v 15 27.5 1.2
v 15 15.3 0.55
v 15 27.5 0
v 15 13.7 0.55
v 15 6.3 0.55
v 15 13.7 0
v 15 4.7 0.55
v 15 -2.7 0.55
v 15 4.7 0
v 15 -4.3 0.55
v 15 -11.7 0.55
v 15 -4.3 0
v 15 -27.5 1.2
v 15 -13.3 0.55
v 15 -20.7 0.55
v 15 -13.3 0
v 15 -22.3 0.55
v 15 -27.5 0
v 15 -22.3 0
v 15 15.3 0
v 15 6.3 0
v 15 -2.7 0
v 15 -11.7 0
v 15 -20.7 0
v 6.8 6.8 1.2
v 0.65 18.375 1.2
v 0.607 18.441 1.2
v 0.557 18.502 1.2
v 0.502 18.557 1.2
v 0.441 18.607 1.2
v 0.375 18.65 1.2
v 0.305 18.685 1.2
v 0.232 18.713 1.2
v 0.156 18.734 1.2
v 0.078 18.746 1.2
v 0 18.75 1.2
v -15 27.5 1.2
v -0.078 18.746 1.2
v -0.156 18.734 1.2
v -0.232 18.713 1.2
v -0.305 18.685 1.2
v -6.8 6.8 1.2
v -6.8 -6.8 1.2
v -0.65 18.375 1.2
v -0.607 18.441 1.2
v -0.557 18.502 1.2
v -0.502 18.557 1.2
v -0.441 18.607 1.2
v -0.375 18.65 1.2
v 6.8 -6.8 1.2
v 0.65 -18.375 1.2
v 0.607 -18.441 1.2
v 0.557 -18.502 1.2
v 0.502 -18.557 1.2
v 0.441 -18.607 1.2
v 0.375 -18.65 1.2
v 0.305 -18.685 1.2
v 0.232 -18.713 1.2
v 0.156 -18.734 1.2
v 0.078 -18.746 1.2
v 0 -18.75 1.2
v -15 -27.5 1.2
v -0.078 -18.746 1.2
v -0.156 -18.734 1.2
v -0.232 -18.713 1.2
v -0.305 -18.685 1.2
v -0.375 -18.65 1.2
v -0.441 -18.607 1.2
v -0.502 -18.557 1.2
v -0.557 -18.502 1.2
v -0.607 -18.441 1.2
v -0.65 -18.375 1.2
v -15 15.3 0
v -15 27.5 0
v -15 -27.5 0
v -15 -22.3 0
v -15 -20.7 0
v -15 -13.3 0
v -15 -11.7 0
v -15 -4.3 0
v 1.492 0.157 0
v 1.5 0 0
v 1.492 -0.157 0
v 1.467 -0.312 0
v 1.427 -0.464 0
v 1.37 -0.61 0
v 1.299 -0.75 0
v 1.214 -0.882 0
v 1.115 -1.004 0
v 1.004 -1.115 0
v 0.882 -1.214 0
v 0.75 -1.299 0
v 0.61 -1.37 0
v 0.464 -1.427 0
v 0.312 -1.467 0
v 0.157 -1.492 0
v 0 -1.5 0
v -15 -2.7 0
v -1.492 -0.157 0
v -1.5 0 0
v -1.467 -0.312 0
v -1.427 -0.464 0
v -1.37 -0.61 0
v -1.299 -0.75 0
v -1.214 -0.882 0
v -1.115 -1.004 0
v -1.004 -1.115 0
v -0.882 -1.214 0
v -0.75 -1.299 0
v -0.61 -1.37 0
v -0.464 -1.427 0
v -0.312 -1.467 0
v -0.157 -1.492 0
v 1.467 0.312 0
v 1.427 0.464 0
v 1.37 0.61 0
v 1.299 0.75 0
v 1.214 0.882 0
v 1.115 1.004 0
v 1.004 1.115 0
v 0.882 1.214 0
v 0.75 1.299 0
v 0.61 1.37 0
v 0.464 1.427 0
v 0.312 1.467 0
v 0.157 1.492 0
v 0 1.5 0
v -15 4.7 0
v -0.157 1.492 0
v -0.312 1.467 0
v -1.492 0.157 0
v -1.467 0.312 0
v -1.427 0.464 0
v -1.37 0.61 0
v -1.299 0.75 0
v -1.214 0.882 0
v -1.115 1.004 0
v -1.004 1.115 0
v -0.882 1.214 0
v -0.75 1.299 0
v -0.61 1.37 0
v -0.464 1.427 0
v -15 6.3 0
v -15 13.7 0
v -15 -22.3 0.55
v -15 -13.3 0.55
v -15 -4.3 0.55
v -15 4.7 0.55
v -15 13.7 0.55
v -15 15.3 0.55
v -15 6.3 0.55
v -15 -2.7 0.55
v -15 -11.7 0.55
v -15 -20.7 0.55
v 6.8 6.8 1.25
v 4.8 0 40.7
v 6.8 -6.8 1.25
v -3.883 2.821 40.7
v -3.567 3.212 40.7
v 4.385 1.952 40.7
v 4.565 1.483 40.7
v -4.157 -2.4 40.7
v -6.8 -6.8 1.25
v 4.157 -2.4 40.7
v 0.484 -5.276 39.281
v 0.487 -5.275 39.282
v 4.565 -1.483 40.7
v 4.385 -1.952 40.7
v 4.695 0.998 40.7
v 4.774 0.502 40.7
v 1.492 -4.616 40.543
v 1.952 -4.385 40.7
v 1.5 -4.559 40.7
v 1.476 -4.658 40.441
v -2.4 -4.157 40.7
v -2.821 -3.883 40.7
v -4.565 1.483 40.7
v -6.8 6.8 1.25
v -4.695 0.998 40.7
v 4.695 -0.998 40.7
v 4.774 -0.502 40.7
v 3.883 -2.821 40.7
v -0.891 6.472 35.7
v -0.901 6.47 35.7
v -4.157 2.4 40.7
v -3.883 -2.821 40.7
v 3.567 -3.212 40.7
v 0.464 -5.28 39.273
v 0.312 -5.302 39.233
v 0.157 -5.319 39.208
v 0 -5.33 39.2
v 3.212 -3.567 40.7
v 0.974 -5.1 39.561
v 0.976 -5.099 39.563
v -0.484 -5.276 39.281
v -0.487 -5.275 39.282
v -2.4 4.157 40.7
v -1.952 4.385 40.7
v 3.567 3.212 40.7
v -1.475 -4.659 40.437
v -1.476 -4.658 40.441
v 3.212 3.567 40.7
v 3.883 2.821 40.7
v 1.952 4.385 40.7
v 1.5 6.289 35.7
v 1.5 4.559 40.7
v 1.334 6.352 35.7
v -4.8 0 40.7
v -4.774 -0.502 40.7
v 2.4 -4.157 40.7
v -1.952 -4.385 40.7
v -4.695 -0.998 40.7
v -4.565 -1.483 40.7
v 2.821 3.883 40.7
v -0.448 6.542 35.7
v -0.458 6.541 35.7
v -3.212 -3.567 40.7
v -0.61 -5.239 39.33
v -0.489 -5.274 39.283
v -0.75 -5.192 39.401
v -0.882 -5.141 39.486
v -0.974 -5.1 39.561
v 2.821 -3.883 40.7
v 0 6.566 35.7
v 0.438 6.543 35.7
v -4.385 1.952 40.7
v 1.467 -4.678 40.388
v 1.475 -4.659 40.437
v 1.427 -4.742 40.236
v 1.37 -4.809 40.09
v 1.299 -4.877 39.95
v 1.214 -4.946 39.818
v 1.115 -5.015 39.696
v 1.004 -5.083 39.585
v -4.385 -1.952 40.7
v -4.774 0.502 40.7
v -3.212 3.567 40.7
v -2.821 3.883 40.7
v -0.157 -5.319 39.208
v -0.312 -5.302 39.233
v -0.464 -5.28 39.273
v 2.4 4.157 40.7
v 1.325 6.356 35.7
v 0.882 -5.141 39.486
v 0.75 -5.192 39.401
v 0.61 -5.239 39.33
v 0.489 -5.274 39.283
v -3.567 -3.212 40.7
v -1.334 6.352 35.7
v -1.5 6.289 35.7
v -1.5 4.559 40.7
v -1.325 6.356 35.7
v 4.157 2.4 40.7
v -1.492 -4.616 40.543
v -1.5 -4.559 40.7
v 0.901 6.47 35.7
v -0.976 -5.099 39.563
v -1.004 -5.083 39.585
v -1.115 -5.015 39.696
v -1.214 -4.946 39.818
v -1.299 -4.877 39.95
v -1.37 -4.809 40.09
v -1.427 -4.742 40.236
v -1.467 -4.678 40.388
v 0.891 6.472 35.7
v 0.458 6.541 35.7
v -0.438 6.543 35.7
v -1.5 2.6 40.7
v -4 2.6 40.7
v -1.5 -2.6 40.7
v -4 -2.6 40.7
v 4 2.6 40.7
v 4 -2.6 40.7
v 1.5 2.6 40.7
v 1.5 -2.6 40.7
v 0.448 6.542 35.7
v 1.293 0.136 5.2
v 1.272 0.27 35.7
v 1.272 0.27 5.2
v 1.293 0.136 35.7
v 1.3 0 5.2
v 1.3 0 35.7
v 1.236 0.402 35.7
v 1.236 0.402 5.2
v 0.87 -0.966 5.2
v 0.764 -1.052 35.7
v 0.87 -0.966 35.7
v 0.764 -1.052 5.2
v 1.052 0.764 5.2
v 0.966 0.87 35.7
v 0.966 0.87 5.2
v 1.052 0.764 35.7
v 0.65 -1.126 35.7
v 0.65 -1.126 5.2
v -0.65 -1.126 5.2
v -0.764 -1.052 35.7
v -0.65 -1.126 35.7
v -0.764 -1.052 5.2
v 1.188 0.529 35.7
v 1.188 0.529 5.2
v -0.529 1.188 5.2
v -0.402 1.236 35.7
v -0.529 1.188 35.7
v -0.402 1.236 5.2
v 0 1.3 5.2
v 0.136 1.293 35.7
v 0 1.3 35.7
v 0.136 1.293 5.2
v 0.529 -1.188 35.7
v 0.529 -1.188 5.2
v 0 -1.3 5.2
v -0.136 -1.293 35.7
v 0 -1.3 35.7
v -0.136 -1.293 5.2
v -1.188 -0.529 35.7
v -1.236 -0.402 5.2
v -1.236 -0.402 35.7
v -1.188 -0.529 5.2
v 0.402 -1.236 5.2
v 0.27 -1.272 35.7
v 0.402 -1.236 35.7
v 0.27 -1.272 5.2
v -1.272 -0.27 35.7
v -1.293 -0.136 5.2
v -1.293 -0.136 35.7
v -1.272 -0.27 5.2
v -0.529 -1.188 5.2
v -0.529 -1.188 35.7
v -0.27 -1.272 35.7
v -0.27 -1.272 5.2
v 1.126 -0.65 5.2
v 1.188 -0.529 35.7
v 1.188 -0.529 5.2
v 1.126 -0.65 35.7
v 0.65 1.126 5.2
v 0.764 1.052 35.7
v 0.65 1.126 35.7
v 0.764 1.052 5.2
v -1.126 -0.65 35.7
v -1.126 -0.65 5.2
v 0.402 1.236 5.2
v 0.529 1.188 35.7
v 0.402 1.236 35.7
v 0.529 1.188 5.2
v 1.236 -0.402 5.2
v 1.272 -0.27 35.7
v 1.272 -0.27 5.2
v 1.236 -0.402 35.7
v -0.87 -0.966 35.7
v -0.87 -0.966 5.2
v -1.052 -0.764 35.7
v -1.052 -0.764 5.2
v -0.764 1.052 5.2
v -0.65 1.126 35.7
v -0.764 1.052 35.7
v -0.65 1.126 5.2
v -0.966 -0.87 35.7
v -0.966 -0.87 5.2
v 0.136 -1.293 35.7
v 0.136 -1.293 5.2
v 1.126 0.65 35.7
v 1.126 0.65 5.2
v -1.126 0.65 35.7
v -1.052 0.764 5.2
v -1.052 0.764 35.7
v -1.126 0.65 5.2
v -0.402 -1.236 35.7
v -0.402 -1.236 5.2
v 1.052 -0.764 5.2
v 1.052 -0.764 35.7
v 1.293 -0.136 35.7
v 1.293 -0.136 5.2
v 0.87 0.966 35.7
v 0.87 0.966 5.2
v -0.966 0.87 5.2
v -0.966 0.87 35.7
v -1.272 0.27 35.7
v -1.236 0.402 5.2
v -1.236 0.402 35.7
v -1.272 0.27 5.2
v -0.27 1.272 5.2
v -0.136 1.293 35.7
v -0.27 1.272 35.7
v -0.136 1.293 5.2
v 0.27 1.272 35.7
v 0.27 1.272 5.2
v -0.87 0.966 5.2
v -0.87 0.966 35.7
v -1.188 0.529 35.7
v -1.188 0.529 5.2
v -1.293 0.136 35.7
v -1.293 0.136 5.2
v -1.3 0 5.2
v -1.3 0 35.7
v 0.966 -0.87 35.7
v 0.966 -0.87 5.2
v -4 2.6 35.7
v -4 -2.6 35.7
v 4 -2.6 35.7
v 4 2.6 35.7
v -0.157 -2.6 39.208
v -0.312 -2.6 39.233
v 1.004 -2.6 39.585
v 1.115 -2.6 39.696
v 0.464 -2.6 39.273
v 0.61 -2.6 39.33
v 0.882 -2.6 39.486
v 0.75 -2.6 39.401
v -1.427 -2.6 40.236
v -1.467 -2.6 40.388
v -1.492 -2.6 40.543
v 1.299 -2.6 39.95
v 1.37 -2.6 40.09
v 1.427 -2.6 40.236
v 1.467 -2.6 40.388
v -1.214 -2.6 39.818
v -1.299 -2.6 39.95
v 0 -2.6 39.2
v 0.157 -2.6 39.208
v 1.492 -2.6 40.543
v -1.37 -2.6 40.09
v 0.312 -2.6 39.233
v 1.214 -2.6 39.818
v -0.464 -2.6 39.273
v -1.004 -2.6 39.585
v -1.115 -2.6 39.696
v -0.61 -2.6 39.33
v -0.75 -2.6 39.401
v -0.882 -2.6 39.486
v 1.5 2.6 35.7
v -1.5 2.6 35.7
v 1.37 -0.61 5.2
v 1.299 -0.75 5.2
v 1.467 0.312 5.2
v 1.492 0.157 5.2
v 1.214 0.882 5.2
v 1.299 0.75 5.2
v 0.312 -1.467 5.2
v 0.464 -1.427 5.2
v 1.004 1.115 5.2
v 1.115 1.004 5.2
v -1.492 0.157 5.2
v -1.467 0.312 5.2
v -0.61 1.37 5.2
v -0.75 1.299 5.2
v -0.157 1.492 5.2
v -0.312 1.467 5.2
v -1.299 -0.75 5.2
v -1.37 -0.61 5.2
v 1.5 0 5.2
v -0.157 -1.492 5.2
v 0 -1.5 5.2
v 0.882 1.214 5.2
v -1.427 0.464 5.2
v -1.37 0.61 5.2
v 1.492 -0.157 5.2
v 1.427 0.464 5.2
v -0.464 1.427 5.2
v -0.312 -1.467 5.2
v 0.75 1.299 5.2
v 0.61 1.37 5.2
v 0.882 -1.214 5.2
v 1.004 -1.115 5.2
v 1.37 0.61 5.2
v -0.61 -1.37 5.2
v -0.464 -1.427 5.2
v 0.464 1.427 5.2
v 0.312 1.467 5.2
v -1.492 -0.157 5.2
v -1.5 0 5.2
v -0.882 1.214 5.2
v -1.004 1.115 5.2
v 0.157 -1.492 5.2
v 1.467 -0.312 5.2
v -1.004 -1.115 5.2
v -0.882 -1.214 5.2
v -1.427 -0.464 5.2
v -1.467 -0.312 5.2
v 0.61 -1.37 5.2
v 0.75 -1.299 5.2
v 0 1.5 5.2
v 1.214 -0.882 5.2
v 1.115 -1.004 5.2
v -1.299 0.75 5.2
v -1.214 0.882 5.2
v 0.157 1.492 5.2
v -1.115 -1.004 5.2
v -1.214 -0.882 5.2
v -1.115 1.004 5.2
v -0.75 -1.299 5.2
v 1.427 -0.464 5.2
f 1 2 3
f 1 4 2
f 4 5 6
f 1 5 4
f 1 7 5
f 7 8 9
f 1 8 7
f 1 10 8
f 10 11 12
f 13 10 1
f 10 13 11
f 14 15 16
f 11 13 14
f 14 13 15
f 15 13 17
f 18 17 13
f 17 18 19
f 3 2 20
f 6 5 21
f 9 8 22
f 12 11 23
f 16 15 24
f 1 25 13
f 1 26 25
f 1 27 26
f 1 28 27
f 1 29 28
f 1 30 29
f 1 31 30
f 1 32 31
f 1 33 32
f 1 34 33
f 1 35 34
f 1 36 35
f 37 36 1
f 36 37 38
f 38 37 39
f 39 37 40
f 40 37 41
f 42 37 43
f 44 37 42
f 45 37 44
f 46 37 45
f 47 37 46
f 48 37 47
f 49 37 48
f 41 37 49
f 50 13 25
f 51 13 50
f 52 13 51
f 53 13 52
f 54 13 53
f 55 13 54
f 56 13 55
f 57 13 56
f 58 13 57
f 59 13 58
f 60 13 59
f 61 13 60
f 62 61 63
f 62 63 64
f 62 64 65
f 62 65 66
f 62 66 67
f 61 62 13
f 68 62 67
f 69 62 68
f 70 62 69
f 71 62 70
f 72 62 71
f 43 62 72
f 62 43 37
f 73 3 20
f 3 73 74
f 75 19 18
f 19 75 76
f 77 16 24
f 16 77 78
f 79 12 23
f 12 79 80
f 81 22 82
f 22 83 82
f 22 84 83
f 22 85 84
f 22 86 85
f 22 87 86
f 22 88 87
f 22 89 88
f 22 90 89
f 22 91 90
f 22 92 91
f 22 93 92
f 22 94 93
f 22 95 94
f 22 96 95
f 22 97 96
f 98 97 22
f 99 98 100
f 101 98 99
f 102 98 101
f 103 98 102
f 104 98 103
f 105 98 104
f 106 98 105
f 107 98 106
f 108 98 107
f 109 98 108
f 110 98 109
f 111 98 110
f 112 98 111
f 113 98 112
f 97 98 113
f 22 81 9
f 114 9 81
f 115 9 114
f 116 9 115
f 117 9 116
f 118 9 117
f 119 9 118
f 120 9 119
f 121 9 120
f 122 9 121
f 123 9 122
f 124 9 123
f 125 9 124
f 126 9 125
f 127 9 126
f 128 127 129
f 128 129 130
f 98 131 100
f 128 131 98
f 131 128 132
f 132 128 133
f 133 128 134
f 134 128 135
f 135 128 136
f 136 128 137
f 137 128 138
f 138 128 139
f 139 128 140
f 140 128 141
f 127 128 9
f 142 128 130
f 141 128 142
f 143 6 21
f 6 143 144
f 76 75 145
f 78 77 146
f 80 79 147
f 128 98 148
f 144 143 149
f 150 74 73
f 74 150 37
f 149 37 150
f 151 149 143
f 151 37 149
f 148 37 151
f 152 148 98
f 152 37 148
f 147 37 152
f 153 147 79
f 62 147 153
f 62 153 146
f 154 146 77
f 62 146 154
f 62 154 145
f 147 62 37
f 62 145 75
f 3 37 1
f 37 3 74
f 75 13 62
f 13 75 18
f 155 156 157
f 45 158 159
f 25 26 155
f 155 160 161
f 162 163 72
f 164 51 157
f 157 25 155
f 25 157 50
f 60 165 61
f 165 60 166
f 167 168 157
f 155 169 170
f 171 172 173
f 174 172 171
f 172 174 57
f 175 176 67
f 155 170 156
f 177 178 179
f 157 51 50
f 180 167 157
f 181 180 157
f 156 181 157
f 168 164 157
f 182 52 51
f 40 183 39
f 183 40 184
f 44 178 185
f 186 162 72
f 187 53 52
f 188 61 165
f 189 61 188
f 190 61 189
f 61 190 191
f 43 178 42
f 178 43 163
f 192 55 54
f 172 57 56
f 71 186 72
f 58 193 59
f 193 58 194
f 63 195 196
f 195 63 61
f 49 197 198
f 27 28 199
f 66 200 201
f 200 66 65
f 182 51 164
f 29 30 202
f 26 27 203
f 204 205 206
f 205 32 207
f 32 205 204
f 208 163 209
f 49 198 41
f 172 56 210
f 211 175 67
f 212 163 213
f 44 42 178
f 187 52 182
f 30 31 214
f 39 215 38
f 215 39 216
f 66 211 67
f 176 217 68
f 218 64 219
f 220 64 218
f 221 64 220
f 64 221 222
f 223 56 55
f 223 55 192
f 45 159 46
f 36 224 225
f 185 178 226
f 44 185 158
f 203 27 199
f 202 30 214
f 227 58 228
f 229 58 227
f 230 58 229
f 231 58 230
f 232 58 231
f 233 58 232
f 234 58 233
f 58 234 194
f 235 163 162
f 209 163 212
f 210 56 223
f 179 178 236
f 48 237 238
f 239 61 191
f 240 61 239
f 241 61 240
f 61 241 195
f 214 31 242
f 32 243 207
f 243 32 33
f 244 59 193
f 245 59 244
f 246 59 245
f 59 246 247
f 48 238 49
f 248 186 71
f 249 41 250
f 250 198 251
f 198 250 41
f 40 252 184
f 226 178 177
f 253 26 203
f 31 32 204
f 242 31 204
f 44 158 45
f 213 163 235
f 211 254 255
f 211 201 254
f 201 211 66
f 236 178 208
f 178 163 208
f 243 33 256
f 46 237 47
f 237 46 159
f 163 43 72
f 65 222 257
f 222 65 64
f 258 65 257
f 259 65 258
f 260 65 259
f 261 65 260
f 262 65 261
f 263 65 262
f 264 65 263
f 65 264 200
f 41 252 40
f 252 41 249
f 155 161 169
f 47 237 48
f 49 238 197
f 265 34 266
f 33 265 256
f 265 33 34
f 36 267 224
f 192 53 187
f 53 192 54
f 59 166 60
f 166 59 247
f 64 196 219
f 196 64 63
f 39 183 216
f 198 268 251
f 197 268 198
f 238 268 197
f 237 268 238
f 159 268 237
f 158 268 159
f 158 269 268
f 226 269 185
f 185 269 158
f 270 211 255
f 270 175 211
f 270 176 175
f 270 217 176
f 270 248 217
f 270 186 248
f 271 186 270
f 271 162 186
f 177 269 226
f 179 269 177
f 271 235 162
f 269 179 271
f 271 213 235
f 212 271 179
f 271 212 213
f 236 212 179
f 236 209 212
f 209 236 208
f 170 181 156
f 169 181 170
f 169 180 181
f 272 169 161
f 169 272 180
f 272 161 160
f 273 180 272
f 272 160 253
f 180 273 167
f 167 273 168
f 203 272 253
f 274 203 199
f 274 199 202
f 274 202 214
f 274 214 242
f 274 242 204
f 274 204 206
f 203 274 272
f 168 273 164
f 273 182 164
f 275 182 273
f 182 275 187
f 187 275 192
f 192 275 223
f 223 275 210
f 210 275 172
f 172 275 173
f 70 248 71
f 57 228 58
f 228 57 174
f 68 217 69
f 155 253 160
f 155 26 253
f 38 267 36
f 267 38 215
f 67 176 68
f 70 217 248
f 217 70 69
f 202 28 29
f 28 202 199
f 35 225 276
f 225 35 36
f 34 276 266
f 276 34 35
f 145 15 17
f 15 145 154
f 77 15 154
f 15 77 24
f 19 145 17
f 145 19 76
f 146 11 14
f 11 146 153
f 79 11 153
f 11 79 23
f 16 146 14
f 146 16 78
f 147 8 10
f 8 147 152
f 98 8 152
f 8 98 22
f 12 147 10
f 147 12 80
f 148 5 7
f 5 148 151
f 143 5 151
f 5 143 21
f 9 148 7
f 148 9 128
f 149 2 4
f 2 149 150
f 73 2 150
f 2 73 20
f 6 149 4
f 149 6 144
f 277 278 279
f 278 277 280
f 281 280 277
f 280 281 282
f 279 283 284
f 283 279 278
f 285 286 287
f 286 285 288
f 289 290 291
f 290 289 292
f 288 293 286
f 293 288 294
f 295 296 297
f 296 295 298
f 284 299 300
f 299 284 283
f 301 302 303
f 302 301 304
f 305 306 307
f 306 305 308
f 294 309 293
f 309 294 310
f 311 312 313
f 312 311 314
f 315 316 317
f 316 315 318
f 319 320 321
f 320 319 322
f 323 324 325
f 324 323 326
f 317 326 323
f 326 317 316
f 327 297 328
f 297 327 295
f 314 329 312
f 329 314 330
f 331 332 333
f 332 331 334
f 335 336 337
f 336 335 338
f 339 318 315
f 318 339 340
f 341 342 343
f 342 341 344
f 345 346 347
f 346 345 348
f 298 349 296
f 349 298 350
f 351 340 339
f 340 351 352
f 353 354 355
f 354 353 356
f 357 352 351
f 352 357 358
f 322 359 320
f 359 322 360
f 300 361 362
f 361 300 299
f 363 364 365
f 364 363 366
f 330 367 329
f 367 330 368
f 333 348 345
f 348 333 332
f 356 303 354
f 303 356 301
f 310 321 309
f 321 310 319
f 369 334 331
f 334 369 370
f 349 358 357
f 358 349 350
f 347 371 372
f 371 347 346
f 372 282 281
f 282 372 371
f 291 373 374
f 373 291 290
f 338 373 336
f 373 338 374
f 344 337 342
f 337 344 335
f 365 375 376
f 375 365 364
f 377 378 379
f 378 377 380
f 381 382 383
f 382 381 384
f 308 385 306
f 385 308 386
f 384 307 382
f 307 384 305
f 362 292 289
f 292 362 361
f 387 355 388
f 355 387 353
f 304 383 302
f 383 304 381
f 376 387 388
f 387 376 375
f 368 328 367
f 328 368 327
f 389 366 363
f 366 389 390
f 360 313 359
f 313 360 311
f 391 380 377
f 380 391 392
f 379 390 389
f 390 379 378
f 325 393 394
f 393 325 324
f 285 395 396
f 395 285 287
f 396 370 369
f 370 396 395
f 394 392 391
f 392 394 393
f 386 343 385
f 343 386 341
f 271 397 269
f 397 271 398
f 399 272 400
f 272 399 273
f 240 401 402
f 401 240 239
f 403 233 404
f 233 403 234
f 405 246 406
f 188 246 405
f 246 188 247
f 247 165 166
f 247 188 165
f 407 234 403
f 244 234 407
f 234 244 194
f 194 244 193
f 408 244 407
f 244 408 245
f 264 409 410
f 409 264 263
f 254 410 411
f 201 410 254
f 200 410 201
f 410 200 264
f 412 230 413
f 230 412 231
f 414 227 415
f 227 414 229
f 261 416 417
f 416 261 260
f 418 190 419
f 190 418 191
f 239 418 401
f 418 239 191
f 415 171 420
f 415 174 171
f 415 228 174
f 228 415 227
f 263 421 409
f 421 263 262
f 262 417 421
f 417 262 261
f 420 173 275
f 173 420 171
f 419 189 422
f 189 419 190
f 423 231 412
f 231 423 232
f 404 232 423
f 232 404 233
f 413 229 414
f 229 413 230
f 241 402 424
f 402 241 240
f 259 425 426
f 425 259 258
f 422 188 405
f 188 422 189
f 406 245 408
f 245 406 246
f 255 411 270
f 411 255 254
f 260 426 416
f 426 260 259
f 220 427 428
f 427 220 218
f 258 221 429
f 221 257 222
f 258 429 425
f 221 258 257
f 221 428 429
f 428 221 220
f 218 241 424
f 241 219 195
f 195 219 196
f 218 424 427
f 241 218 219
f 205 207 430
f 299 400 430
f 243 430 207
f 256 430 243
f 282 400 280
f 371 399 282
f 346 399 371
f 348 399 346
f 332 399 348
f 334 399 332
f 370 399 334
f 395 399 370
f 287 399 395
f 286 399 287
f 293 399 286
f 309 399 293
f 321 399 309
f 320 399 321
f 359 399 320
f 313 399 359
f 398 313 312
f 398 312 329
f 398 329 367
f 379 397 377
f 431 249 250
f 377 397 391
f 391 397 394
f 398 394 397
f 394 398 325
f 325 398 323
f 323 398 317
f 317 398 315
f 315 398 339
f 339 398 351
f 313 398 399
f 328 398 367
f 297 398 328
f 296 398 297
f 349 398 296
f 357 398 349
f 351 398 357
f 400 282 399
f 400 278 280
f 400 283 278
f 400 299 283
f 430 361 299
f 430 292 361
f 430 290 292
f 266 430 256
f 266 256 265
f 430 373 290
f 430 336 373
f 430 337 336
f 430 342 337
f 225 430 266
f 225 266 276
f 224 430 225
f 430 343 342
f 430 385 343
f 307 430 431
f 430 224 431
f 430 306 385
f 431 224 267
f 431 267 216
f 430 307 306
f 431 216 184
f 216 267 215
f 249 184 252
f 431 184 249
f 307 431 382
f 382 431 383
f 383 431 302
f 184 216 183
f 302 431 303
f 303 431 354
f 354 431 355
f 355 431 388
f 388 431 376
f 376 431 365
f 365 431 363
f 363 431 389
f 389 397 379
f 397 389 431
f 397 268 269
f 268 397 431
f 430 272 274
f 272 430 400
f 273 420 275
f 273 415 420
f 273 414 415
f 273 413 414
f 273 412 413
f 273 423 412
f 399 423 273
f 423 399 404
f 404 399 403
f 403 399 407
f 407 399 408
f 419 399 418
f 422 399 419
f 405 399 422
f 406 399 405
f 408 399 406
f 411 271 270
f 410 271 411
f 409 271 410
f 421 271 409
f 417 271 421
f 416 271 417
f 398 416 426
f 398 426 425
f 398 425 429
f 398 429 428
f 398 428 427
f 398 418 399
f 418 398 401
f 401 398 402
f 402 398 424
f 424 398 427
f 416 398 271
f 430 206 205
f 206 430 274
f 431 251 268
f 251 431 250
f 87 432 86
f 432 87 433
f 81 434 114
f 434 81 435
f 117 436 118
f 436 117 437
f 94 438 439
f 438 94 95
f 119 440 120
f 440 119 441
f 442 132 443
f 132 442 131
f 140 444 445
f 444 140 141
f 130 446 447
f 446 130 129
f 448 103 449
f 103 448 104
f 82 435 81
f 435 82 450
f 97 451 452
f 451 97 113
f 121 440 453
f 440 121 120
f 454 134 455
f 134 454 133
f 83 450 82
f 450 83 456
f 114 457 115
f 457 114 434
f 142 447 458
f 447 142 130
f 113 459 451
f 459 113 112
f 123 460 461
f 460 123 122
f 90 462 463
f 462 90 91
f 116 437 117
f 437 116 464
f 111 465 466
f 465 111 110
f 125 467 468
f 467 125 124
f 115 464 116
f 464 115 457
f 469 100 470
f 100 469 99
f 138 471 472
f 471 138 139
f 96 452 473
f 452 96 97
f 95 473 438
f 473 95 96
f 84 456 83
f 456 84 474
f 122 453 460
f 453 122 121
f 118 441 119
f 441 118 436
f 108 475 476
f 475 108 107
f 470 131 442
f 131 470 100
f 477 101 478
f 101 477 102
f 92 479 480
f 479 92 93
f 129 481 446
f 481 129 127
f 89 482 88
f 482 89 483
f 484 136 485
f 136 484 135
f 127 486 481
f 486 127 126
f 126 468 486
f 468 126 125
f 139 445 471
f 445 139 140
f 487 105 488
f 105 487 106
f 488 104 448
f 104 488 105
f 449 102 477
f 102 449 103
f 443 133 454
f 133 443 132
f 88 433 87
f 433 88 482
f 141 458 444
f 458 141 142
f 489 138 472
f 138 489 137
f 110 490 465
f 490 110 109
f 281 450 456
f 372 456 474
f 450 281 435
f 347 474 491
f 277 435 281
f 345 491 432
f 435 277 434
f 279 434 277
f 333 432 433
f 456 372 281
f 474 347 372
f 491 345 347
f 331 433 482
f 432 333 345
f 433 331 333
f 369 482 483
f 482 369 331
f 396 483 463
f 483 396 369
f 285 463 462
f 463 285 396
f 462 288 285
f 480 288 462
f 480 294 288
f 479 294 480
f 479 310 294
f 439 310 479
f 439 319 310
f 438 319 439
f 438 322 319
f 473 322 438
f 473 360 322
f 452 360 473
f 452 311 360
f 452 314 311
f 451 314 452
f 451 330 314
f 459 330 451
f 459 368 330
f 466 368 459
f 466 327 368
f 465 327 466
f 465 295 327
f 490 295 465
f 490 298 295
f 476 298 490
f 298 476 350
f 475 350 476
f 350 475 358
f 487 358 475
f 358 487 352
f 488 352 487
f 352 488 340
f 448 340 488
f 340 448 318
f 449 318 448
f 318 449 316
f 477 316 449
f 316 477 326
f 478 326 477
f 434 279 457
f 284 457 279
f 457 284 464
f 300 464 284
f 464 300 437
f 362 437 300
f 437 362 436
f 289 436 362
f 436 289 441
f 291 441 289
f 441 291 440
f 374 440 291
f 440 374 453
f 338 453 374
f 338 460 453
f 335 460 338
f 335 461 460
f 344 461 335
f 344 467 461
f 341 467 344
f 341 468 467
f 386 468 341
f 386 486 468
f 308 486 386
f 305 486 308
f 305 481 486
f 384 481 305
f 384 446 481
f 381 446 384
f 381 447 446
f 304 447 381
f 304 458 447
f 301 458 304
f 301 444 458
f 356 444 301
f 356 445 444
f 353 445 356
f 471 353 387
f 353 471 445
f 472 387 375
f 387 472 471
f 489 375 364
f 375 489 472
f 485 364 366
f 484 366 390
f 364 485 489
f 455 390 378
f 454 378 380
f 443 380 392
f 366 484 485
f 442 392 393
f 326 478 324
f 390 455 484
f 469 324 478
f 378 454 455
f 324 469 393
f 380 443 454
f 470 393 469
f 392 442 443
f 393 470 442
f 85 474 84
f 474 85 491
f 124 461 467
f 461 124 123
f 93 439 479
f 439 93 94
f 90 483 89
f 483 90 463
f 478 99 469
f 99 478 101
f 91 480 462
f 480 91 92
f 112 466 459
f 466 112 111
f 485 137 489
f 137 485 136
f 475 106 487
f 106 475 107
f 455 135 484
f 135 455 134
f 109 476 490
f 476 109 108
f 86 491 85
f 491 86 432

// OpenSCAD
// =============================================================================
// PROJECT: VERTICAL FIXED-WING "AERO-FOIL" ELRS MOUNT
// VERSION: 1.2 (Symmetrical Airfoil & Glue-Retention)
// DESCRIPTION: Dual-teardrop profile (Airfoil) for zero-drag performance.
//              Optimized for glue-retention (no zip-tie slots).
// =============================================================================

/* [1. BASE PLATE SETTINGS] */
base_w          = 30.0;  
base_l          = 55.0;  // Slightly longer to accommodate the dual-taper
base_thick      = 1.2;   
slot_width      = 1.6;   

/* [2. ANTENNA HARDWARE SPECS] */
dipole_arm_l    = 32.0;  
junction_l      = 7.5;   
junction_dia    = 5.2;   
wire_dia        = 2.6;   
feedline_dia    = 3.0;   
wall_thickness  = 2.2; 

/* [3. AERO SETTINGS] */
// How far the "points" of the teardrop extend from the center (mm)
aero_taper_dist = 18.0; 
$fn = 60;

/* [4. DYNAMIC CALCULATIONS] */
pylon_h = dipole_arm_l + junction_l; 
pylon_dia = junction_dia + (wall_thickness * 2);

// =============================================================================
// MAIN ASSEMBLY
// =============================================================================

difference() {
    
    // --- STEP 1: THE SOLID BODY (The Symmetrical Airfoil) ---
    union() {
        // A. The Flexible Base Plate
        translate([0, 0, base_thick/2])
            cube([base_w, base_l, base_thick], center=true);
        
        // B. The Double-Teardrop Pylon (Airfoil)
        hull() {
            // 1. The Central Cylinder (Houses the hardware)
            cylinder(h=pylon_h + base_thick, d=pylon_dia);
            
            // 2. The Leading Edge (Front Point)
            translate([0, -aero_taper_dist, 0])
                cylinder(h=base_thick, d=1.5); 
            
            // 3. The Trailing Edge (Rear Point)
            translate([0, aero_taper_dist, 0])
                cylinder(h=base_thick, d=1.5); 

            // 4. Base Gusset (Structural support)
            translate([0, 0, base_thick])
                cube([pylon_dia + 4, pylon_dia + 4, 0.1], center=true);
        }
    }

    // --- STEP 2: THE SUBTRACTIONS ---

    // A. FLEX RELIEF SLOTS (Bottom membrane only)
    for(i = [-base_l/2 + 6 : 9 : base_l/2 - 6]) {
        translate([0, i, -0.1])
            cube([base_w + 2, slot_width, base_thick + 0.1], center=true);
    }

    // B. THE ANTENNA CAVITY (Top-Down)
    translate([0, 0, pylon_h + base_thick]) {
        
        // 1. Vertical Dipole Bore
        translate([0, 0, -pylon_h - 1])
            cylinder(h=pylon_h + 2, d=wire_dia);
            
        // 2. T-Junction "Saddle" 
        rotate([0, 90, 0])
            cylinder(h=junction_l + 0.5, d=junction_dia, center=true);
            
        // 3. Feedline Exit (Rear-facing)
        translate([0, pylon_dia/2, 0])
            rotate([90, 0, 0])
                cylinder(h=aero_taper_dist + 5, d=feedline_dia);

        // 4. Top Access Slots (Clean drop-in)
        cube([junction_l + 0.5, junction_dia, 10], center=true);
        translate([0, aero_taper_dist/2, 0])
            cube([feedline_dia, aero_taper_dist, 10], center=true);
    }

    // C. WIRE POKEOUT (Through-base access)
    translate([0, 0, -1])
        cylinder(h=base_thick + 5, d=feedline_dia);
}
